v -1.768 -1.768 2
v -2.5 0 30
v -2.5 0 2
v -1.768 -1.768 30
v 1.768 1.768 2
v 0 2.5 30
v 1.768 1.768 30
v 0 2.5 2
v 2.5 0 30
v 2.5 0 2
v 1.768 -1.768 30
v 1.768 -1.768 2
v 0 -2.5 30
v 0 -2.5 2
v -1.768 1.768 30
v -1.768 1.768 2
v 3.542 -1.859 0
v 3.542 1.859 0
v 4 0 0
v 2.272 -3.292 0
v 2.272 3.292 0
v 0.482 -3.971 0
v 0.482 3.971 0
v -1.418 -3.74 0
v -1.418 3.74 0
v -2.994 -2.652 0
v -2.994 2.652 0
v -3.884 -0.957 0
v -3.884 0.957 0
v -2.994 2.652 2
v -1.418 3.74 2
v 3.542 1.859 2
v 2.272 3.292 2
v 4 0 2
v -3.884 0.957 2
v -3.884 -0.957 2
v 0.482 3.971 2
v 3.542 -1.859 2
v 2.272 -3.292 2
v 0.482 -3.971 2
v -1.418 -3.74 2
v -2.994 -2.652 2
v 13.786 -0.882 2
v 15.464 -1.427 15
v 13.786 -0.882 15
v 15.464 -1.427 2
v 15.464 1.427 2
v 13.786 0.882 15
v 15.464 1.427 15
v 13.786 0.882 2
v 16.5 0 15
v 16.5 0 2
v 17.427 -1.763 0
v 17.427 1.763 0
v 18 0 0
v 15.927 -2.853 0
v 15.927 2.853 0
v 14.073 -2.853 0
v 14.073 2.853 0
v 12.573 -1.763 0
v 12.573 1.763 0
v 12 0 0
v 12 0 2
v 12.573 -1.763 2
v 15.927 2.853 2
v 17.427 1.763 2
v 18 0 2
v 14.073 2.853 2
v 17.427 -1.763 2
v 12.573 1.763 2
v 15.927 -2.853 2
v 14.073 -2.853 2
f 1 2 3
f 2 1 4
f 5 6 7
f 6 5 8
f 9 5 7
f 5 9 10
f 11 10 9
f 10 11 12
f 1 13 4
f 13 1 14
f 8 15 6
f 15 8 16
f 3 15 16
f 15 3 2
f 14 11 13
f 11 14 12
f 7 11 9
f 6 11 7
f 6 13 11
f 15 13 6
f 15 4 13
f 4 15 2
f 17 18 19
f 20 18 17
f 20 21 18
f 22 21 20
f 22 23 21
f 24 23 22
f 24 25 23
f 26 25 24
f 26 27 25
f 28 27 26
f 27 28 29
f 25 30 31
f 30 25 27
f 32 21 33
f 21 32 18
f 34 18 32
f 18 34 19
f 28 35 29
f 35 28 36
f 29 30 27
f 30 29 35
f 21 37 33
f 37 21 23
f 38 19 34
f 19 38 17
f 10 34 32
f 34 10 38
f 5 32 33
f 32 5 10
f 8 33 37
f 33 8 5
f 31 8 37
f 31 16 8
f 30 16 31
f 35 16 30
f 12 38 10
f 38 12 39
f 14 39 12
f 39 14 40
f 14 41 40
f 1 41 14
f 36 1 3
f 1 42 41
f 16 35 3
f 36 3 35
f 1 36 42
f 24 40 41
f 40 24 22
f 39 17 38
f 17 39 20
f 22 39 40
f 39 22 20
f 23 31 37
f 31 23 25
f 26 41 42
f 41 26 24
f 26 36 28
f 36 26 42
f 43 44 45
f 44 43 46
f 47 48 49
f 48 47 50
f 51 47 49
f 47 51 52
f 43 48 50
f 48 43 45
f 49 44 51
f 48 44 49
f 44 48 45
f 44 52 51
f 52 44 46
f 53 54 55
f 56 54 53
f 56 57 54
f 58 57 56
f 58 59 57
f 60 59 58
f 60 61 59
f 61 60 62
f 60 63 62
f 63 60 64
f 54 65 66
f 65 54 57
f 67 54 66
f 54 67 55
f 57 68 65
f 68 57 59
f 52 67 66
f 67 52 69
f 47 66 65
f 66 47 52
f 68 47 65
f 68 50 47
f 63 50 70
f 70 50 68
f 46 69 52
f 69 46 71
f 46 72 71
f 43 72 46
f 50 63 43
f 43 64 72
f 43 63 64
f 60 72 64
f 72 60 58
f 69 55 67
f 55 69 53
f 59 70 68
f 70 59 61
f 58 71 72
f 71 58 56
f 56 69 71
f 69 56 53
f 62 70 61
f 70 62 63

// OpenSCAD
// Enkel skrue som gjenbrukbar modul
module skrue(lengde=20, diameter=4, hode_diameter=8) {
    union() {
        cylinder(h=lengde, r=diameter/2);   // Skruestamme
        cylinder(h=2, r=hode_diameter/2);   // Skruehode
    }
}

skrue(lengde=30, diameter=5);
translate([15, 0, 0]) skrue(lengde=15, diameter=3, hode_diameter=6);
